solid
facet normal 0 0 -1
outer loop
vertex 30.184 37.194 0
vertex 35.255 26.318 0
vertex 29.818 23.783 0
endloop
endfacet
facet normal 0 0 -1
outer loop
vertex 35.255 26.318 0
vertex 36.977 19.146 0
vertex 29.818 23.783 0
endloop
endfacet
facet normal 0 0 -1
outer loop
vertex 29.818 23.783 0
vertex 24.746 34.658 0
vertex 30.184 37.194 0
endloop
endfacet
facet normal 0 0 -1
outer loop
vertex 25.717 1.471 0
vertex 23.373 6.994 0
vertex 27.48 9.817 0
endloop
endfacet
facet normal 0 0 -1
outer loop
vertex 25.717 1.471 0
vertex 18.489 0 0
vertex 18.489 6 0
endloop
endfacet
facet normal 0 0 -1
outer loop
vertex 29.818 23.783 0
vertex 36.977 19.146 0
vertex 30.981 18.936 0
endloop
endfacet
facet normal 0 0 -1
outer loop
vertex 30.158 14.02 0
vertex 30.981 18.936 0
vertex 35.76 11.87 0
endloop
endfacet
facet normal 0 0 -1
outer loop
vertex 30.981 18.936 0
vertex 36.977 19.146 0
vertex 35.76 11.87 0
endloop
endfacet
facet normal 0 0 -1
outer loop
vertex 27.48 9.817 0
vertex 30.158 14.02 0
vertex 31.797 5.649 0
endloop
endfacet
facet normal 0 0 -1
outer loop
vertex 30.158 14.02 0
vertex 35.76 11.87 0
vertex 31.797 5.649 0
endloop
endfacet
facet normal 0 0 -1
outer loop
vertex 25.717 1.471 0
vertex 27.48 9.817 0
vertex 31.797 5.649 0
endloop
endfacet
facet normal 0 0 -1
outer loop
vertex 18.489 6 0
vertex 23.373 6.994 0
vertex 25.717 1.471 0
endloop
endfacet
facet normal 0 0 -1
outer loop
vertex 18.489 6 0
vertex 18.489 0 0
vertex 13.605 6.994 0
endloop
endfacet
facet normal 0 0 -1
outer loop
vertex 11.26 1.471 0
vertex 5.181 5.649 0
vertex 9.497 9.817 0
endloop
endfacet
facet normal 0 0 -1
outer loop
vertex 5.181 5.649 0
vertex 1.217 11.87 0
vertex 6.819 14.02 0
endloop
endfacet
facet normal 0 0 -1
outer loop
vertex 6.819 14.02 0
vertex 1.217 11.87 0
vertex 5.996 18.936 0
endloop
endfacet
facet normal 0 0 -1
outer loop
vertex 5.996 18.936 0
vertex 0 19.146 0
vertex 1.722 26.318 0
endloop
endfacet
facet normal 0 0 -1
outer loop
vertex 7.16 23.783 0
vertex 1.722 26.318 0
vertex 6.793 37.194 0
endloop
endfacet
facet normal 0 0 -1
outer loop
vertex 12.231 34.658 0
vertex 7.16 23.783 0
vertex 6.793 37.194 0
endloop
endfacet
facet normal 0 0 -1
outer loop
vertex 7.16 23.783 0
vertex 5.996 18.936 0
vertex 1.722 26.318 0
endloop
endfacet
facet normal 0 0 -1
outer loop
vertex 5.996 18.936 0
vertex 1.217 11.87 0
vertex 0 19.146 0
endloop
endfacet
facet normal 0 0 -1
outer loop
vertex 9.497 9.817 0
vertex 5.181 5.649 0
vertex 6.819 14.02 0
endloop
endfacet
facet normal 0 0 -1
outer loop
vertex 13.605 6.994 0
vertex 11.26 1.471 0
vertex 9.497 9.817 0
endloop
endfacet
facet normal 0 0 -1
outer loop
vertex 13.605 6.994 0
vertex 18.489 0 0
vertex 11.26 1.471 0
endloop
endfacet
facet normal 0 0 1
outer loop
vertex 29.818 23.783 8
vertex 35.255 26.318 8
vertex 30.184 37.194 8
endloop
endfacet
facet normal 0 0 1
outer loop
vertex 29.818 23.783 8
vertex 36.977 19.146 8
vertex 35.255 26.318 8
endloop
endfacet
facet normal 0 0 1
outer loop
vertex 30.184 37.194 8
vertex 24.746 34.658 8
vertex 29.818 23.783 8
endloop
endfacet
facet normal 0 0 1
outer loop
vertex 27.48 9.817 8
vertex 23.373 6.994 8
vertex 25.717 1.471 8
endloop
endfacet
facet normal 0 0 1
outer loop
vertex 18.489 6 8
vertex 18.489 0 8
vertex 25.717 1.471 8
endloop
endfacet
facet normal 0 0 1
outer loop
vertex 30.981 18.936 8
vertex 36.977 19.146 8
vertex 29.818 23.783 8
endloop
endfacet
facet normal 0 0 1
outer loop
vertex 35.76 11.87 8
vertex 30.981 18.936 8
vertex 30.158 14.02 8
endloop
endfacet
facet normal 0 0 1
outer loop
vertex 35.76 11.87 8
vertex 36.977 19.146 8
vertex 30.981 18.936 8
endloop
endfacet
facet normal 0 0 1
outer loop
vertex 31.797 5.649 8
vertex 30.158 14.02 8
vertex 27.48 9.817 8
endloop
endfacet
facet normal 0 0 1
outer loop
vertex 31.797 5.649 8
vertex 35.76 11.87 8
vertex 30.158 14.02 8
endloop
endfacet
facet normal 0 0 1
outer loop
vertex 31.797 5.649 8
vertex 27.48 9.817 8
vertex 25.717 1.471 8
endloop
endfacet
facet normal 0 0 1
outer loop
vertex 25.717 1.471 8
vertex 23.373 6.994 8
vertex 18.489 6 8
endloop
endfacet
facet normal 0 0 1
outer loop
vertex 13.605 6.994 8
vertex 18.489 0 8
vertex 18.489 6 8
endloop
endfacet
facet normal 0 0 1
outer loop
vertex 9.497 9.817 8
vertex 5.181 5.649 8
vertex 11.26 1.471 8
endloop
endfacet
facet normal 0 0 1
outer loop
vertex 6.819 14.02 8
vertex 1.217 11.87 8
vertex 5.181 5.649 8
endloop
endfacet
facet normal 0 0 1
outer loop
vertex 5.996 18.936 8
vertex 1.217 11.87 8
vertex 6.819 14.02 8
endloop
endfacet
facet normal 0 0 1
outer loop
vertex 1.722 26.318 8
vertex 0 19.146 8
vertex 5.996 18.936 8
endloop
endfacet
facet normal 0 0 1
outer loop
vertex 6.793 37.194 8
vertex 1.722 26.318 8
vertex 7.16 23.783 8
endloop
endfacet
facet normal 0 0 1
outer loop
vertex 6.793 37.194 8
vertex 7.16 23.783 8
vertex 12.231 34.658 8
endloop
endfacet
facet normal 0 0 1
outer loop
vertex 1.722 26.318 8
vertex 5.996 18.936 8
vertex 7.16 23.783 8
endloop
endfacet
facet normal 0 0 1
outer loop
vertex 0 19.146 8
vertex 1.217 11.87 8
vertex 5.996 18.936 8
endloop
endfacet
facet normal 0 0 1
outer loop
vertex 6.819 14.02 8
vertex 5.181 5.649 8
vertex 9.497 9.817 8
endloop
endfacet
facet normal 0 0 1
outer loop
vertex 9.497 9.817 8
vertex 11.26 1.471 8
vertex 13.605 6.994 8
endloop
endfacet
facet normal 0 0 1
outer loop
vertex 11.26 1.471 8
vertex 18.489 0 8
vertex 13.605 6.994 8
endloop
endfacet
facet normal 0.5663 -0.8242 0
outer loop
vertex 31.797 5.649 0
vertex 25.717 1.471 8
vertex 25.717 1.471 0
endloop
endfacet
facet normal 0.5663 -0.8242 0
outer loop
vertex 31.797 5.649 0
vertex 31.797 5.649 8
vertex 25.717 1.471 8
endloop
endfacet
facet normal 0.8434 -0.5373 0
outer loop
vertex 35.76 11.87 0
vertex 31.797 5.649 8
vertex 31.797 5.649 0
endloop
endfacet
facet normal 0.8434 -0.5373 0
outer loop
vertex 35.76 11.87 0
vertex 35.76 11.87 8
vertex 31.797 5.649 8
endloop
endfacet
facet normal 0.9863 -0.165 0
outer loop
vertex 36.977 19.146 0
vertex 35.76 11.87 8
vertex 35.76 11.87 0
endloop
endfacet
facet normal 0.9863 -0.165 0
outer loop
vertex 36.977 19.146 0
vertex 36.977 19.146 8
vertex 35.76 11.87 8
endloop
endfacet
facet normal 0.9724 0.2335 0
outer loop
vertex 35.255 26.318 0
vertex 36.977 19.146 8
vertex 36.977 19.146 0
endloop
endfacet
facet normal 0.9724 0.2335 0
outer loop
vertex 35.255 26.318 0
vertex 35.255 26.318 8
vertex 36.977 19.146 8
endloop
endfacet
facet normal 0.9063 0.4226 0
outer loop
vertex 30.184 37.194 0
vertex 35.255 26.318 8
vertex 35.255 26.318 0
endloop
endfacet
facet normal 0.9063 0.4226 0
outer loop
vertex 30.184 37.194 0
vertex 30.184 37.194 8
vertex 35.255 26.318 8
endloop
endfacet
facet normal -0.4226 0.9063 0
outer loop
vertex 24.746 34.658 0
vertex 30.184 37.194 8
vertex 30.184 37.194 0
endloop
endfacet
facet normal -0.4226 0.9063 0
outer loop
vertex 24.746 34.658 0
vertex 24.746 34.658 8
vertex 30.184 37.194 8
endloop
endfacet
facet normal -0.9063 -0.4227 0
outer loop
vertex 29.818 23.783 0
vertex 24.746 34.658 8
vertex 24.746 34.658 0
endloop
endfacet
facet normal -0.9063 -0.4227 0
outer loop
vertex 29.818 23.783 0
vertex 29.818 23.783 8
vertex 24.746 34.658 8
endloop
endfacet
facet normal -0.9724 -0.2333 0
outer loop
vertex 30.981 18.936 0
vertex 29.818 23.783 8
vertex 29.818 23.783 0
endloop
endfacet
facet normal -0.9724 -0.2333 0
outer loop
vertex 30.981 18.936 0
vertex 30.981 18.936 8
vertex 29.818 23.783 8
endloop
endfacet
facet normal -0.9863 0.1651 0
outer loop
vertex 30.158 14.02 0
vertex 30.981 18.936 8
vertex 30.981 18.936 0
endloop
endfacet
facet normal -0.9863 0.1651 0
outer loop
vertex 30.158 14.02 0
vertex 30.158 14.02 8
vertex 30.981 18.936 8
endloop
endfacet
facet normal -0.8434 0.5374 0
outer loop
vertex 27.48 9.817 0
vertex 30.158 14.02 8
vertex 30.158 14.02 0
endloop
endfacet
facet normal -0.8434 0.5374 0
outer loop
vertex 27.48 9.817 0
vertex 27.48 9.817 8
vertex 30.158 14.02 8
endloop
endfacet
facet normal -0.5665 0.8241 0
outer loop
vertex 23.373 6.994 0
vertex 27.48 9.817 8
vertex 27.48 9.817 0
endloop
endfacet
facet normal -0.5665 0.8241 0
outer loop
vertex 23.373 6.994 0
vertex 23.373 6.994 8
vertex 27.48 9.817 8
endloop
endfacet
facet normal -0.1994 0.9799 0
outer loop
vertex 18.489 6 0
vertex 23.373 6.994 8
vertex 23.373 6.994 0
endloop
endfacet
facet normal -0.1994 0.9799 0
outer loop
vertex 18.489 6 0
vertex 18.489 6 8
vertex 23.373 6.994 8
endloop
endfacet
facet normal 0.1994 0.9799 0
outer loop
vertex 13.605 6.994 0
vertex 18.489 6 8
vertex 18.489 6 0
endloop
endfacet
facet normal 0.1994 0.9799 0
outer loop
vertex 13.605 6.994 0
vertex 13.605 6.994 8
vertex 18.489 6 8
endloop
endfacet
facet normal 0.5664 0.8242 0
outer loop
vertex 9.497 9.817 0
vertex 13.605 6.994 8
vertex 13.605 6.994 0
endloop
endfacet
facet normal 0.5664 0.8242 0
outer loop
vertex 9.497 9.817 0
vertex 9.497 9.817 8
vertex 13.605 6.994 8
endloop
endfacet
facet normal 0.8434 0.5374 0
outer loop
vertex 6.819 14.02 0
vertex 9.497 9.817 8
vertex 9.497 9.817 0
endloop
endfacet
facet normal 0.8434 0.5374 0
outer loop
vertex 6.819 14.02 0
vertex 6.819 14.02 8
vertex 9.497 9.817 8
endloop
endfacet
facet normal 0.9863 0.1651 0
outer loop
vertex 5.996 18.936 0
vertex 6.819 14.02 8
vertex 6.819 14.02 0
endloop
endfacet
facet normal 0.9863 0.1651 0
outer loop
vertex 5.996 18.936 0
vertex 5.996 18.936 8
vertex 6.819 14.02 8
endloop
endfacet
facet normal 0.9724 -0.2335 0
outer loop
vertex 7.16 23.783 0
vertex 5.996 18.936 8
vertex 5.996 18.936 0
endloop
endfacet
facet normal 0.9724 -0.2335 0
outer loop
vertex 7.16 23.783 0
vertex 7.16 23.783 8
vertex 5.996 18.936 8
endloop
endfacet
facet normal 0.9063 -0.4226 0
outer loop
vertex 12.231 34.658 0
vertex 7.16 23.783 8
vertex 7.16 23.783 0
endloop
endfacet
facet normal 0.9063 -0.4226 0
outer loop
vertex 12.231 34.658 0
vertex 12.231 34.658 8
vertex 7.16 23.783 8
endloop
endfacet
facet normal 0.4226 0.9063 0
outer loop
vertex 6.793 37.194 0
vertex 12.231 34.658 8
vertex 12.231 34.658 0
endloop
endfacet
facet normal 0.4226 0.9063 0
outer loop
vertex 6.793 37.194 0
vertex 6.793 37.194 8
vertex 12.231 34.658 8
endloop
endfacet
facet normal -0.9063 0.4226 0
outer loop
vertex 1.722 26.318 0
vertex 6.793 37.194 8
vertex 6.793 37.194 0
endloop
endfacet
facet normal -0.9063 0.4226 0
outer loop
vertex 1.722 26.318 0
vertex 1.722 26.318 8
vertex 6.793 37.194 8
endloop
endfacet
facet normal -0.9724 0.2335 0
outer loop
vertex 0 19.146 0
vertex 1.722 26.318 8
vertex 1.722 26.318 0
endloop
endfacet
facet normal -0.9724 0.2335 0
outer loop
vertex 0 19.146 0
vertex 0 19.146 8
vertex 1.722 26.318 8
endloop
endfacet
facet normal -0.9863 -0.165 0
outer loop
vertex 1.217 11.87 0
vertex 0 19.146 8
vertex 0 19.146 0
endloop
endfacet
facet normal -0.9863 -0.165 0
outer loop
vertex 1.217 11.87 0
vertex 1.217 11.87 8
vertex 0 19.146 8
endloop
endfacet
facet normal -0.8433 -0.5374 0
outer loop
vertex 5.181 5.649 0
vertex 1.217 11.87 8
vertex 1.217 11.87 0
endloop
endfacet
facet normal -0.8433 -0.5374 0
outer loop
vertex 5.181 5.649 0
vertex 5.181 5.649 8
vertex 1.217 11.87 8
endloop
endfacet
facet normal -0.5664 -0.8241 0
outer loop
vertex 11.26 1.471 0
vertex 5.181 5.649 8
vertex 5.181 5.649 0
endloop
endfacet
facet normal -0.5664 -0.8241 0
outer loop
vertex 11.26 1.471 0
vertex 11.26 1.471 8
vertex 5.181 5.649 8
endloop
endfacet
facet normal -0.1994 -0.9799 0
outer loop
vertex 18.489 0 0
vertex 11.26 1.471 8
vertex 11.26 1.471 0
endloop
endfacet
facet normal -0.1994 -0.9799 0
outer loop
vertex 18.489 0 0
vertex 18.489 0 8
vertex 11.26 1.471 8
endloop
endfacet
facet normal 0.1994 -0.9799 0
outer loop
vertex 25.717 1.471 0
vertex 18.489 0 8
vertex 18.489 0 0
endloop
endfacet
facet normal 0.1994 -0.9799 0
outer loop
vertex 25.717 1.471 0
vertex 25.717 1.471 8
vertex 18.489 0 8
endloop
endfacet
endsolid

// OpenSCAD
$fn = 32;

// ----------------------------------------------------------------------
// Clip blank: omega clip, 8 mm thick
// ----------------------------------------------------------------------

// --- parameters (mm) ---
profile_height = 8;       // extrusion height
profile_points = 26;      // points of the closed outline

profile = [[1.722, 26.318], [0, 19.146], [1.217, 11.87], [5.181, 5.649], [11.26, 1.471], [18.489, 0], [25.717, 1.471], [31.797, 5.649], [35.76, 11.87], [36.977, 19.146], [35.255, 26.318], [30.184, 37.194], [24.746, 34.658], [29.818, 23.783], [30.981, 18.936], [30.158, 14.02], [27.48, 9.817], [23.373, 6.994], [18.489, 6], [13.605, 6.994], [9.497, 9.817], [6.819, 14.02], [5.996, 18.936], [7.16, 23.783], [12.231, 34.658], [6.793, 37.194]];  // single closed polygon, 26 points, counter clockwise

// --- the one profile operation ---
linear_extrude(height = profile_height) polygon(points = profile);
